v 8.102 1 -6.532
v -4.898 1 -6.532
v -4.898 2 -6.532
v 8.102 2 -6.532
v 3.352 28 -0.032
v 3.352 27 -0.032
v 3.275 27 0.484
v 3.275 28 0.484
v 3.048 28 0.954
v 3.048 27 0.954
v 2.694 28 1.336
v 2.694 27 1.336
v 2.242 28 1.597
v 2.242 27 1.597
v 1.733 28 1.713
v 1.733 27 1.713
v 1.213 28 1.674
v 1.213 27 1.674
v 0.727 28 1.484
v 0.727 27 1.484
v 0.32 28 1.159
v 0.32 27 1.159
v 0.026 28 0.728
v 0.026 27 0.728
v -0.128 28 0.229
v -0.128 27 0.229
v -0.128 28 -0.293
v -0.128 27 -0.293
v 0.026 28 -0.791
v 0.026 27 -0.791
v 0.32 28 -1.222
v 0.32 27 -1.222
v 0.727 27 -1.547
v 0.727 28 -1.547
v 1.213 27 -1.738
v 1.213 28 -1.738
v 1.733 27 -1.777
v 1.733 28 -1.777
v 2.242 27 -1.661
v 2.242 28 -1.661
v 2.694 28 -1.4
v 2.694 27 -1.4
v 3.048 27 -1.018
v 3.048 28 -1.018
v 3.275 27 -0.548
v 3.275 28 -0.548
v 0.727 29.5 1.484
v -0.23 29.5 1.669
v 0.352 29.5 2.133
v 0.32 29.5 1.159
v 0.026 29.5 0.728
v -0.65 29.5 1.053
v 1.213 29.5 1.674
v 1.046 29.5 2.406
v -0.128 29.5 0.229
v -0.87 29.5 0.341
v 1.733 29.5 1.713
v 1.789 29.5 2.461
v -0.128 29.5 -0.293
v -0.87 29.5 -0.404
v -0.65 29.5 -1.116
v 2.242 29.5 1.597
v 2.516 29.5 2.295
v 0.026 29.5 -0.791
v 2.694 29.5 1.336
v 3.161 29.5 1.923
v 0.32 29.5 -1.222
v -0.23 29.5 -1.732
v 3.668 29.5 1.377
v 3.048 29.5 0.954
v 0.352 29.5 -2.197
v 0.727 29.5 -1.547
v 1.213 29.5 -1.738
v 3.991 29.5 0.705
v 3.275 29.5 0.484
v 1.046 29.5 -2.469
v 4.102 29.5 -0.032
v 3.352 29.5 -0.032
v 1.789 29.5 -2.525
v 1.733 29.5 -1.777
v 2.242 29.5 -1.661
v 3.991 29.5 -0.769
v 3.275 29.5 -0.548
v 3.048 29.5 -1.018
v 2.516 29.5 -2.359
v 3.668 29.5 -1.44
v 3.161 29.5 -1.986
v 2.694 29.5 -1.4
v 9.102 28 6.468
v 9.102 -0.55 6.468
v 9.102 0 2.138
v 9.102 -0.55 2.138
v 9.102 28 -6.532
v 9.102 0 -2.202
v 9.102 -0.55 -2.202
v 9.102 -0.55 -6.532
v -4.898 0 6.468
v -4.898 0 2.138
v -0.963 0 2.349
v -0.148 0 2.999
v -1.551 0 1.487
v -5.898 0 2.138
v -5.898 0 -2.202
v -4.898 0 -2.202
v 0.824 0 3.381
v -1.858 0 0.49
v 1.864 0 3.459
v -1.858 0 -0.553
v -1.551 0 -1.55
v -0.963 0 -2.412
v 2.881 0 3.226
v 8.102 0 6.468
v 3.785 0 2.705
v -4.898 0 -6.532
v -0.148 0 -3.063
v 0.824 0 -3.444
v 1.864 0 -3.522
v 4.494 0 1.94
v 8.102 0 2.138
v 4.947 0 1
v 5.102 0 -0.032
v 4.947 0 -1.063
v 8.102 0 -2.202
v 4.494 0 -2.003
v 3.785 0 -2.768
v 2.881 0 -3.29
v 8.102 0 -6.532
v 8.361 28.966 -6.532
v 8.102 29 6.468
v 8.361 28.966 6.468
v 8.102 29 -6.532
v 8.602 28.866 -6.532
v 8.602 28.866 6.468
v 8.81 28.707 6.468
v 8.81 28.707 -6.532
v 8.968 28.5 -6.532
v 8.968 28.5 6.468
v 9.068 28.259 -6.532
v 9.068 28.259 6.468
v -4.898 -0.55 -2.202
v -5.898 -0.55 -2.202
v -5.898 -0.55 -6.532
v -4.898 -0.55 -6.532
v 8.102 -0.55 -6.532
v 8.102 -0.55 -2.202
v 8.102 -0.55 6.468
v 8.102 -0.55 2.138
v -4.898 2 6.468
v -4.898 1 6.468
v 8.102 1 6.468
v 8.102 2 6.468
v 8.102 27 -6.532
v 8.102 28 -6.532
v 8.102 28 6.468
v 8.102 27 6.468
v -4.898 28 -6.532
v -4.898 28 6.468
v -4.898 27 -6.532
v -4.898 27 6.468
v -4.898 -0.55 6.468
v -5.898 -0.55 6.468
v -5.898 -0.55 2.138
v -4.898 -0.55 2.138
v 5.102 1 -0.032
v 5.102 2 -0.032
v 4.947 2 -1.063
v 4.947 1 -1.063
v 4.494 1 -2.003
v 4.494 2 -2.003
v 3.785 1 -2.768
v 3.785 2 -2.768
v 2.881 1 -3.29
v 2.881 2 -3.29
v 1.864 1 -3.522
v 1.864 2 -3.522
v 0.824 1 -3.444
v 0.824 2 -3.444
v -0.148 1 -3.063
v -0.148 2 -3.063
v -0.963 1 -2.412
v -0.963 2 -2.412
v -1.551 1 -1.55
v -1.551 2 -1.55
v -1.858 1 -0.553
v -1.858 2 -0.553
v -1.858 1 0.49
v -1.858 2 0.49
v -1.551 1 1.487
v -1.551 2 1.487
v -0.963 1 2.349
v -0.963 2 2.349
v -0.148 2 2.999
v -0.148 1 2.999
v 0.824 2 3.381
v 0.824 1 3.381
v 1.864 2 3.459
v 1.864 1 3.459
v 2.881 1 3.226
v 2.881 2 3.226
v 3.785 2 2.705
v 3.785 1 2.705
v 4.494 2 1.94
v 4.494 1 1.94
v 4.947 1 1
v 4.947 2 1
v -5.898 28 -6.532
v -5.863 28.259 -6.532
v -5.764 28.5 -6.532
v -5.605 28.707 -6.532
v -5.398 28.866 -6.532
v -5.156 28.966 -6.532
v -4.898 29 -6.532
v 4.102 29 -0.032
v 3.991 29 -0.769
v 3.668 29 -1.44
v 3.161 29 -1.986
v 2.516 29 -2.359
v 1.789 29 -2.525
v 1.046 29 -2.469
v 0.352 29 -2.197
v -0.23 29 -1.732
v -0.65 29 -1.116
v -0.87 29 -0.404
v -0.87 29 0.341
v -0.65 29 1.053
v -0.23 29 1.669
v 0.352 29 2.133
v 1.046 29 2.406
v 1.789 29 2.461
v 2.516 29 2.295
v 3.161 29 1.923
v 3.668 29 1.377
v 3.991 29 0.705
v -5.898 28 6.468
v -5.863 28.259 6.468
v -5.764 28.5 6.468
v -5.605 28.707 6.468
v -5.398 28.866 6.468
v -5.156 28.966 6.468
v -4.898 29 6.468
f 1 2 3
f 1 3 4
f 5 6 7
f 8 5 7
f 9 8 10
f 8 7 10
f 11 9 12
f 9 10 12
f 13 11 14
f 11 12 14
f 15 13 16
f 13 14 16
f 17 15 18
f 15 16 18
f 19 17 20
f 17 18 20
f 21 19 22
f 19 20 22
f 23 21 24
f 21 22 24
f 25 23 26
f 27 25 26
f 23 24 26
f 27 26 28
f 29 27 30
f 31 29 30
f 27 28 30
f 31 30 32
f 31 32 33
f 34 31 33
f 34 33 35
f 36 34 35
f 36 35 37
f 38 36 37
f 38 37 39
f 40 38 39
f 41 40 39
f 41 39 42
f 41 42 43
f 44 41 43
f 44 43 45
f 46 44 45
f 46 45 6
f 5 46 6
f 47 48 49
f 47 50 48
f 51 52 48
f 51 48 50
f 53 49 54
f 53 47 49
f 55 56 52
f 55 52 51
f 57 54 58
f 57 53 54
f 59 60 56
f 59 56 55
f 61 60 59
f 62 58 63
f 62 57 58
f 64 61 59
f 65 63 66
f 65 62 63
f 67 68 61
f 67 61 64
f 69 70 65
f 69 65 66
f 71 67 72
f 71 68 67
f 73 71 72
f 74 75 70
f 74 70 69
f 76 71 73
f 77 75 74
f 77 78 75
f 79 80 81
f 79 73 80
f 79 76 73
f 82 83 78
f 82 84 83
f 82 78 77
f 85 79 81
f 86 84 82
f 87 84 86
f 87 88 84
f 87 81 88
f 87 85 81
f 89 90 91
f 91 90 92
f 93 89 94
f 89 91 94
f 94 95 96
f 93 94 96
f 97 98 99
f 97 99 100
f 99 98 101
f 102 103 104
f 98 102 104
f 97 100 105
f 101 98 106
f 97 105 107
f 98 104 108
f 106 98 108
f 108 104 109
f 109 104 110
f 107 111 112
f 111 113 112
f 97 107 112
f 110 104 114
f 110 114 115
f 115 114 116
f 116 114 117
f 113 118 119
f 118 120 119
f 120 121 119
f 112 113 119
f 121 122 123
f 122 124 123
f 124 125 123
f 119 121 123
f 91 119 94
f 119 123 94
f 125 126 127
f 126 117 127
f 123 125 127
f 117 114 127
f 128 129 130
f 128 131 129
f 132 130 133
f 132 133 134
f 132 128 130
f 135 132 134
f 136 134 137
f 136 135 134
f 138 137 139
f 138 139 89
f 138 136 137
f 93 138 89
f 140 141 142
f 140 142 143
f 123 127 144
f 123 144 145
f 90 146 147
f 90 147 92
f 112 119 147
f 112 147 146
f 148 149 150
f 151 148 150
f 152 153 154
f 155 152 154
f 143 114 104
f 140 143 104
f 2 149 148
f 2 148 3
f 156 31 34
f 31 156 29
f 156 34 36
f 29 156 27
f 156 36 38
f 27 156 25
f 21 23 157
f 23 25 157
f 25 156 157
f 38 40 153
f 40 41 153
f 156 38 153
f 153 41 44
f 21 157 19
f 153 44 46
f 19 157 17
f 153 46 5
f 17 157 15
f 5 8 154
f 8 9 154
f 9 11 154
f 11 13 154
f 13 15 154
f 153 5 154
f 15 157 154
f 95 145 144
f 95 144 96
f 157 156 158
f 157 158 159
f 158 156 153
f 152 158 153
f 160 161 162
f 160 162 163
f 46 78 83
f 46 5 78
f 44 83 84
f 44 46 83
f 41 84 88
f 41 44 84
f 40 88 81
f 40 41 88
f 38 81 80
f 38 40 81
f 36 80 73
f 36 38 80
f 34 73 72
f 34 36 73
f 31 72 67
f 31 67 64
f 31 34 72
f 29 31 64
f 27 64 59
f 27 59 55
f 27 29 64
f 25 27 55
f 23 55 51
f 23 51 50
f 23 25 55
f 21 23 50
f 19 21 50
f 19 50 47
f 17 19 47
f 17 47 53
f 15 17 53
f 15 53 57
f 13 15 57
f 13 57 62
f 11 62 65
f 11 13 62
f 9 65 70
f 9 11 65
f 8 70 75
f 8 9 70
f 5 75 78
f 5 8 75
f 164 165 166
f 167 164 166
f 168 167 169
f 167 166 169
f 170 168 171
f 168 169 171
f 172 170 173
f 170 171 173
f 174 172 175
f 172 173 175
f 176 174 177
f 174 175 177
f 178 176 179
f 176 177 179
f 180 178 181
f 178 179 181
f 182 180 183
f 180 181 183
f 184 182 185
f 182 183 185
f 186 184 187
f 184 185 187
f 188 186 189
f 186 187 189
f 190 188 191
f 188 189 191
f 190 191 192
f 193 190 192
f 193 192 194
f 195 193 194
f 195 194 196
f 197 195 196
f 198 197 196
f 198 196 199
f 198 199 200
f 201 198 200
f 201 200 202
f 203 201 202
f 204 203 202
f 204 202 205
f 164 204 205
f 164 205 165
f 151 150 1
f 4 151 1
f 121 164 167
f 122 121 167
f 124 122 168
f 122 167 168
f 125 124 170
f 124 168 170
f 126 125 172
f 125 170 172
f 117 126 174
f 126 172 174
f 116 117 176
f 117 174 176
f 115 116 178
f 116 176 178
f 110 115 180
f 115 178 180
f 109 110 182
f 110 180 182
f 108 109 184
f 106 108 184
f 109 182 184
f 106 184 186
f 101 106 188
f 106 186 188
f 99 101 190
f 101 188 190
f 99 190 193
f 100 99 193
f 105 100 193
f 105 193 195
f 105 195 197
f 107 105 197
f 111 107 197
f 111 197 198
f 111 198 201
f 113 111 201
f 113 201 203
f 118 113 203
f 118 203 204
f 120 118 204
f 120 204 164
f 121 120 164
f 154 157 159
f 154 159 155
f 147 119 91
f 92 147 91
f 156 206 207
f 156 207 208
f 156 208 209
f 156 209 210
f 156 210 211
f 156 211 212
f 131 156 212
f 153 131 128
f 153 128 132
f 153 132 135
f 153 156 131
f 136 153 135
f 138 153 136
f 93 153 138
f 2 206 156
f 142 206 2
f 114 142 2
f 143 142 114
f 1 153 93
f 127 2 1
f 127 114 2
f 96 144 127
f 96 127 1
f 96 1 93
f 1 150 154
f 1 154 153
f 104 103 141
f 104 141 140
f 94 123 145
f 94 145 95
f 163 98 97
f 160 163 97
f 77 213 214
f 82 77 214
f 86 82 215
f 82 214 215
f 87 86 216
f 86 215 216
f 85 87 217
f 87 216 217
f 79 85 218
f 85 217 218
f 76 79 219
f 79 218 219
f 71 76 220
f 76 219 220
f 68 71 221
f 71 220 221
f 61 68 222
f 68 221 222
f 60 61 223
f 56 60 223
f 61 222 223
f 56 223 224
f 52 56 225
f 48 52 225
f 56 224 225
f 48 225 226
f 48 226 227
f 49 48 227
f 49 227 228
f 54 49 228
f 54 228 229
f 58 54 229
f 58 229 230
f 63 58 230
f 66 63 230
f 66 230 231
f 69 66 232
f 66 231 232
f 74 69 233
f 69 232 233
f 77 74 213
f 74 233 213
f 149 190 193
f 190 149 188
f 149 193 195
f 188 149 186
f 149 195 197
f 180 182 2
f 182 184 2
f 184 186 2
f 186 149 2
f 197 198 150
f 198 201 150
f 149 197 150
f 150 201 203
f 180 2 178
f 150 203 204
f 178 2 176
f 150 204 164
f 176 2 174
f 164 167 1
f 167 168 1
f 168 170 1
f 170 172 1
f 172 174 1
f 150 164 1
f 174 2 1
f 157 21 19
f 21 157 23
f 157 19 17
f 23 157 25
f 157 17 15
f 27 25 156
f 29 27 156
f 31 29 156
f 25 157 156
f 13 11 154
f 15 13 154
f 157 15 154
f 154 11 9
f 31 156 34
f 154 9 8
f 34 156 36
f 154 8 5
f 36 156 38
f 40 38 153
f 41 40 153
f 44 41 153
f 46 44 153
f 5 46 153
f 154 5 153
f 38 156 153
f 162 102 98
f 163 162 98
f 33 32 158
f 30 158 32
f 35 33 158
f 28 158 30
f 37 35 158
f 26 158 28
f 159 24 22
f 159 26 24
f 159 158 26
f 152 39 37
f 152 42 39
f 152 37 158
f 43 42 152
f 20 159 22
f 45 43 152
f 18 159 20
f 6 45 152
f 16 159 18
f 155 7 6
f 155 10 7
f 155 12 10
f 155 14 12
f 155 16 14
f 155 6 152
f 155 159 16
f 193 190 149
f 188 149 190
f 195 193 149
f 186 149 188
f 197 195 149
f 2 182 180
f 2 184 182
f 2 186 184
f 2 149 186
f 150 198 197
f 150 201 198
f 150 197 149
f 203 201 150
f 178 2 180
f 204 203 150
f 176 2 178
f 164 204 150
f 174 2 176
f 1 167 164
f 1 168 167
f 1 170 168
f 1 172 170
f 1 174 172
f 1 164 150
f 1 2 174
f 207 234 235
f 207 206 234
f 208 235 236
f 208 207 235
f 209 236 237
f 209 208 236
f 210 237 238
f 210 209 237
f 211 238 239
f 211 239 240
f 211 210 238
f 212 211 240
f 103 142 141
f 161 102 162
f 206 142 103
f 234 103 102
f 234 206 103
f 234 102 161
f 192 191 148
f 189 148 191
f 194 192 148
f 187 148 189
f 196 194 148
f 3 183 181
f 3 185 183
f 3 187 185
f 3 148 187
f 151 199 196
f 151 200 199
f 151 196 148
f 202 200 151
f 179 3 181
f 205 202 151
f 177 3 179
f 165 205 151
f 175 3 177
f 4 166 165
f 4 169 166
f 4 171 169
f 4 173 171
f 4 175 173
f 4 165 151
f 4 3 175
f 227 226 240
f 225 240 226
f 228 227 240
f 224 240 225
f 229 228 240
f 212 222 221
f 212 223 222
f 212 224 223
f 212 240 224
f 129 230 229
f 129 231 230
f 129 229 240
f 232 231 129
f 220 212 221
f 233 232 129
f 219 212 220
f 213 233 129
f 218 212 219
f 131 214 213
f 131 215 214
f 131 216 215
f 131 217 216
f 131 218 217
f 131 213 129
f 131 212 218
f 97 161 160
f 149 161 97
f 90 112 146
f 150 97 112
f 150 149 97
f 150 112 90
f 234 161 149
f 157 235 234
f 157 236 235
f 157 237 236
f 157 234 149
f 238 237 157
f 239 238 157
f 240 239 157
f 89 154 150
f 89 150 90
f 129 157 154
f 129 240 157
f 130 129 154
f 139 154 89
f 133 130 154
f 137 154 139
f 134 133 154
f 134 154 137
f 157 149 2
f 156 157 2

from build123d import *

# Parameters (mm, degrees)
SKETCH1_W           = 15
SKETCH1_H           = 13
BOSS_EXTRUDE1_DEPTH = 1
SKETCH2_W           = 1
SKETCH2_H           = 13
BOSS_EXTRUDE2_DEPTH = 27
SKETCH3_W           = 15
SKETCH3_H           = 13
BOSS_EXTRUDE3_DEPTH = 1
FILLET1_R           = 1
FILLET2_R           = 1
SKETCH4_W           = 1
SKETCH4_H           = 4.33
BOSS_EXTRUDE4_DEPTH = 0.55
SKETCH5_W           = 13
SKETCH5_H           = 13
BOSS_EXTRUDE5_DEPTH = 1
SKETCH7_W           = 13
SKETCH7_H           = 13
BOSS_EXTRUDE6_DEPTH = 1
SKETCH8_R           = 3.5
CUT_EXTRUDE1_DEPTH  = 3.55
SKETCH9_R           = 1.75
CUT_EXTRUDE2_DEPTH  = 3
SKETCH10_R          = 2.5
SKETCH10_R_2        = 1.75
BOSS_EXTRUDE7_DEPTH = 0.5


with BuildPart() as part:
    # Sketch1 → Boss-Extrude1 (new body)
    with BuildSketch(Plane(origin=(0, 0, 0), x_dir=(1, 0, 0), z_dir=(0, 1, 0))):
        with Locations((1.602439024, 0.031707317)):
            Rectangle(SKETCH1_W, SKETCH1_H)
    extrude(amount=BOSS_EXTRUDE1_DEPTH)

    # Sketch2 → Boss-Extrude2 (add)
    with BuildSketch(Plane(origin=(0, 1, 0), x_dir=(1, 0, 0), z_dir=(0, 1, 0))):
        with Locations((-5.397560976, 0.031707317)):
            Rectangle(SKETCH2_W, SKETCH2_H)
        with Locations((8.602439024, 0.031707317)):
            Rectangle(SKETCH2_W, SKETCH2_H)
    extrude(amount=BOSS_EXTRUDE2_DEPTH)

    # Sketch3 → Boss-Extrude3 (add)
    with BuildSketch(Plane(origin=(0, 28, 0), x_dir=(1, 0, 0), z_dir=(0, 1, 0))):
        with Locations((1.602439024, 0.031707317)):
            Rectangle(SKETCH3_W, SKETCH3_H)
    extrude(amount=BOSS_EXTRUDE3_DEPTH)

    # Fillet1
    fillet1_edges = [part.edges().sort_by_distance(p)[0] for p in [
        (-5.897560976, 29, -0.031707317),
    ]]
    fillet(fillet1_edges, radius=FILLET1_R)

    # Fillet2
    fillet2_edges = [part.edges().sort_by_distance(p)[0] for p in [
        (9.102439024, 29, -0.031707317),
    ]]
    fillet(fillet2_edges, radius=FILLET2_R)

    # Sketch4 → Boss-Extrude4 (add)
    with BuildSketch(Plane.XZ):
        with Locations((-5.397560976, 4.303292683)):
            Rectangle(SKETCH4_W, SKETCH4_H)
        with Locations((8.602439024, 4.303292683)):
            Rectangle(SKETCH4_W, SKETCH4_H)
        with Locations((-5.397560976, -4.366707317)):
            Rectangle(SKETCH4_W, SKETCH4_H)
        with Locations((8.602439024, -4.366707317)):
            Rectangle(SKETCH4_W, SKETCH4_H)
    extrude(amount=BOSS_EXTRUDE4_DEPTH)


with BuildPart() as body_2:
    # Sketch5 → Boss-Extrude5 (new body)
    with BuildSketch(Plane(origin=(0, 1, 0), x_dir=(1, 0, 0), z_dir=(0, 1, 0))):
        with Locations((1.602439024, 0.031707317)):
            Rectangle(SKETCH5_W, SKETCH5_H)
    extrude(amount=BOSS_EXTRUDE5_DEPTH)


with BuildPart() as body_3:
    # Sketch7 → Boss-Extrude6 (new body)
    with BuildSketch(Plane.XZ.offset(-28)):
        with Locations((1.602439024, -0.031707317)):
            Rectangle(SKETCH7_W, SKETCH7_H)
    extrude(amount=BOSS_EXTRUDE6_DEPTH)


with BuildPart() as cut_extrude1_tool:
    # Sketch8 → Cut-Extrude1 (new body, through all)
    with BuildSketch(Plane(origin=(0, 2, 0), x_dir=(1, 0, 0), z_dir=(0, 1, 0))):
        with Locations((1.602439024, 0.031707317)):
            Circle(SKETCH8_R)
    extrude(amount=-CUT_EXTRUDE1_DEPTH)


with BuildPart() as part_1:
    add(part.part)

    # Cut-Extrude1: cut by cut_extrude1_tool
    add(cut_extrude1_tool.part, mode=Mode.SUBTRACT)


with BuildPart() as body_2_1:
    add(body_2.part)

    # Cut-Extrude1: cut by cut_extrude1_tool
    add(cut_extrude1_tool.part, mode=Mode.SUBTRACT)


with BuildPart() as cut_extrude2_tool:
    # Sketch9 → Cut-Extrude2 (new body, through all)
    with BuildSketch(Plane.XZ.offset(-27)):
        with Locations((1.602439024, -0.031707317)):
            Circle(SKETCH9_R)
    extrude(amount=-CUT_EXTRUDE2_DEPTH)


with BuildPart() as part_2:
    add(part_1.part)

    # Cut-Extrude2: cut by cut_extrude2_tool
    add(cut_extrude2_tool.part, mode=Mode.SUBTRACT)

    # Sketch10 → Boss-Extrude7 (add)
    with BuildSketch(Plane(origin=(0, 29, 0), x_dir=(1, 0, 0), z_dir=(0, 1, 0))):
        with Locations((1.602439024, 0.031707317)):
            Circle(SKETCH10_R)
        with Locations((1.602439024, 0.031707317)):
            Circle(SKETCH10_R_2, mode=Mode.SUBTRACT)
    extrude(amount=BOSS_EXTRUDE7_DEPTH)


with BuildPart() as body_3_1:
    add(body_3.part)

    # Cut-Extrude2: cut by cut_extrude2_tool
    add(cut_extrude2_tool.part, mode=Mode.SUBTRACT)


solid = Compound([body_2_1.part, part_2.part, body_3_1.part])
